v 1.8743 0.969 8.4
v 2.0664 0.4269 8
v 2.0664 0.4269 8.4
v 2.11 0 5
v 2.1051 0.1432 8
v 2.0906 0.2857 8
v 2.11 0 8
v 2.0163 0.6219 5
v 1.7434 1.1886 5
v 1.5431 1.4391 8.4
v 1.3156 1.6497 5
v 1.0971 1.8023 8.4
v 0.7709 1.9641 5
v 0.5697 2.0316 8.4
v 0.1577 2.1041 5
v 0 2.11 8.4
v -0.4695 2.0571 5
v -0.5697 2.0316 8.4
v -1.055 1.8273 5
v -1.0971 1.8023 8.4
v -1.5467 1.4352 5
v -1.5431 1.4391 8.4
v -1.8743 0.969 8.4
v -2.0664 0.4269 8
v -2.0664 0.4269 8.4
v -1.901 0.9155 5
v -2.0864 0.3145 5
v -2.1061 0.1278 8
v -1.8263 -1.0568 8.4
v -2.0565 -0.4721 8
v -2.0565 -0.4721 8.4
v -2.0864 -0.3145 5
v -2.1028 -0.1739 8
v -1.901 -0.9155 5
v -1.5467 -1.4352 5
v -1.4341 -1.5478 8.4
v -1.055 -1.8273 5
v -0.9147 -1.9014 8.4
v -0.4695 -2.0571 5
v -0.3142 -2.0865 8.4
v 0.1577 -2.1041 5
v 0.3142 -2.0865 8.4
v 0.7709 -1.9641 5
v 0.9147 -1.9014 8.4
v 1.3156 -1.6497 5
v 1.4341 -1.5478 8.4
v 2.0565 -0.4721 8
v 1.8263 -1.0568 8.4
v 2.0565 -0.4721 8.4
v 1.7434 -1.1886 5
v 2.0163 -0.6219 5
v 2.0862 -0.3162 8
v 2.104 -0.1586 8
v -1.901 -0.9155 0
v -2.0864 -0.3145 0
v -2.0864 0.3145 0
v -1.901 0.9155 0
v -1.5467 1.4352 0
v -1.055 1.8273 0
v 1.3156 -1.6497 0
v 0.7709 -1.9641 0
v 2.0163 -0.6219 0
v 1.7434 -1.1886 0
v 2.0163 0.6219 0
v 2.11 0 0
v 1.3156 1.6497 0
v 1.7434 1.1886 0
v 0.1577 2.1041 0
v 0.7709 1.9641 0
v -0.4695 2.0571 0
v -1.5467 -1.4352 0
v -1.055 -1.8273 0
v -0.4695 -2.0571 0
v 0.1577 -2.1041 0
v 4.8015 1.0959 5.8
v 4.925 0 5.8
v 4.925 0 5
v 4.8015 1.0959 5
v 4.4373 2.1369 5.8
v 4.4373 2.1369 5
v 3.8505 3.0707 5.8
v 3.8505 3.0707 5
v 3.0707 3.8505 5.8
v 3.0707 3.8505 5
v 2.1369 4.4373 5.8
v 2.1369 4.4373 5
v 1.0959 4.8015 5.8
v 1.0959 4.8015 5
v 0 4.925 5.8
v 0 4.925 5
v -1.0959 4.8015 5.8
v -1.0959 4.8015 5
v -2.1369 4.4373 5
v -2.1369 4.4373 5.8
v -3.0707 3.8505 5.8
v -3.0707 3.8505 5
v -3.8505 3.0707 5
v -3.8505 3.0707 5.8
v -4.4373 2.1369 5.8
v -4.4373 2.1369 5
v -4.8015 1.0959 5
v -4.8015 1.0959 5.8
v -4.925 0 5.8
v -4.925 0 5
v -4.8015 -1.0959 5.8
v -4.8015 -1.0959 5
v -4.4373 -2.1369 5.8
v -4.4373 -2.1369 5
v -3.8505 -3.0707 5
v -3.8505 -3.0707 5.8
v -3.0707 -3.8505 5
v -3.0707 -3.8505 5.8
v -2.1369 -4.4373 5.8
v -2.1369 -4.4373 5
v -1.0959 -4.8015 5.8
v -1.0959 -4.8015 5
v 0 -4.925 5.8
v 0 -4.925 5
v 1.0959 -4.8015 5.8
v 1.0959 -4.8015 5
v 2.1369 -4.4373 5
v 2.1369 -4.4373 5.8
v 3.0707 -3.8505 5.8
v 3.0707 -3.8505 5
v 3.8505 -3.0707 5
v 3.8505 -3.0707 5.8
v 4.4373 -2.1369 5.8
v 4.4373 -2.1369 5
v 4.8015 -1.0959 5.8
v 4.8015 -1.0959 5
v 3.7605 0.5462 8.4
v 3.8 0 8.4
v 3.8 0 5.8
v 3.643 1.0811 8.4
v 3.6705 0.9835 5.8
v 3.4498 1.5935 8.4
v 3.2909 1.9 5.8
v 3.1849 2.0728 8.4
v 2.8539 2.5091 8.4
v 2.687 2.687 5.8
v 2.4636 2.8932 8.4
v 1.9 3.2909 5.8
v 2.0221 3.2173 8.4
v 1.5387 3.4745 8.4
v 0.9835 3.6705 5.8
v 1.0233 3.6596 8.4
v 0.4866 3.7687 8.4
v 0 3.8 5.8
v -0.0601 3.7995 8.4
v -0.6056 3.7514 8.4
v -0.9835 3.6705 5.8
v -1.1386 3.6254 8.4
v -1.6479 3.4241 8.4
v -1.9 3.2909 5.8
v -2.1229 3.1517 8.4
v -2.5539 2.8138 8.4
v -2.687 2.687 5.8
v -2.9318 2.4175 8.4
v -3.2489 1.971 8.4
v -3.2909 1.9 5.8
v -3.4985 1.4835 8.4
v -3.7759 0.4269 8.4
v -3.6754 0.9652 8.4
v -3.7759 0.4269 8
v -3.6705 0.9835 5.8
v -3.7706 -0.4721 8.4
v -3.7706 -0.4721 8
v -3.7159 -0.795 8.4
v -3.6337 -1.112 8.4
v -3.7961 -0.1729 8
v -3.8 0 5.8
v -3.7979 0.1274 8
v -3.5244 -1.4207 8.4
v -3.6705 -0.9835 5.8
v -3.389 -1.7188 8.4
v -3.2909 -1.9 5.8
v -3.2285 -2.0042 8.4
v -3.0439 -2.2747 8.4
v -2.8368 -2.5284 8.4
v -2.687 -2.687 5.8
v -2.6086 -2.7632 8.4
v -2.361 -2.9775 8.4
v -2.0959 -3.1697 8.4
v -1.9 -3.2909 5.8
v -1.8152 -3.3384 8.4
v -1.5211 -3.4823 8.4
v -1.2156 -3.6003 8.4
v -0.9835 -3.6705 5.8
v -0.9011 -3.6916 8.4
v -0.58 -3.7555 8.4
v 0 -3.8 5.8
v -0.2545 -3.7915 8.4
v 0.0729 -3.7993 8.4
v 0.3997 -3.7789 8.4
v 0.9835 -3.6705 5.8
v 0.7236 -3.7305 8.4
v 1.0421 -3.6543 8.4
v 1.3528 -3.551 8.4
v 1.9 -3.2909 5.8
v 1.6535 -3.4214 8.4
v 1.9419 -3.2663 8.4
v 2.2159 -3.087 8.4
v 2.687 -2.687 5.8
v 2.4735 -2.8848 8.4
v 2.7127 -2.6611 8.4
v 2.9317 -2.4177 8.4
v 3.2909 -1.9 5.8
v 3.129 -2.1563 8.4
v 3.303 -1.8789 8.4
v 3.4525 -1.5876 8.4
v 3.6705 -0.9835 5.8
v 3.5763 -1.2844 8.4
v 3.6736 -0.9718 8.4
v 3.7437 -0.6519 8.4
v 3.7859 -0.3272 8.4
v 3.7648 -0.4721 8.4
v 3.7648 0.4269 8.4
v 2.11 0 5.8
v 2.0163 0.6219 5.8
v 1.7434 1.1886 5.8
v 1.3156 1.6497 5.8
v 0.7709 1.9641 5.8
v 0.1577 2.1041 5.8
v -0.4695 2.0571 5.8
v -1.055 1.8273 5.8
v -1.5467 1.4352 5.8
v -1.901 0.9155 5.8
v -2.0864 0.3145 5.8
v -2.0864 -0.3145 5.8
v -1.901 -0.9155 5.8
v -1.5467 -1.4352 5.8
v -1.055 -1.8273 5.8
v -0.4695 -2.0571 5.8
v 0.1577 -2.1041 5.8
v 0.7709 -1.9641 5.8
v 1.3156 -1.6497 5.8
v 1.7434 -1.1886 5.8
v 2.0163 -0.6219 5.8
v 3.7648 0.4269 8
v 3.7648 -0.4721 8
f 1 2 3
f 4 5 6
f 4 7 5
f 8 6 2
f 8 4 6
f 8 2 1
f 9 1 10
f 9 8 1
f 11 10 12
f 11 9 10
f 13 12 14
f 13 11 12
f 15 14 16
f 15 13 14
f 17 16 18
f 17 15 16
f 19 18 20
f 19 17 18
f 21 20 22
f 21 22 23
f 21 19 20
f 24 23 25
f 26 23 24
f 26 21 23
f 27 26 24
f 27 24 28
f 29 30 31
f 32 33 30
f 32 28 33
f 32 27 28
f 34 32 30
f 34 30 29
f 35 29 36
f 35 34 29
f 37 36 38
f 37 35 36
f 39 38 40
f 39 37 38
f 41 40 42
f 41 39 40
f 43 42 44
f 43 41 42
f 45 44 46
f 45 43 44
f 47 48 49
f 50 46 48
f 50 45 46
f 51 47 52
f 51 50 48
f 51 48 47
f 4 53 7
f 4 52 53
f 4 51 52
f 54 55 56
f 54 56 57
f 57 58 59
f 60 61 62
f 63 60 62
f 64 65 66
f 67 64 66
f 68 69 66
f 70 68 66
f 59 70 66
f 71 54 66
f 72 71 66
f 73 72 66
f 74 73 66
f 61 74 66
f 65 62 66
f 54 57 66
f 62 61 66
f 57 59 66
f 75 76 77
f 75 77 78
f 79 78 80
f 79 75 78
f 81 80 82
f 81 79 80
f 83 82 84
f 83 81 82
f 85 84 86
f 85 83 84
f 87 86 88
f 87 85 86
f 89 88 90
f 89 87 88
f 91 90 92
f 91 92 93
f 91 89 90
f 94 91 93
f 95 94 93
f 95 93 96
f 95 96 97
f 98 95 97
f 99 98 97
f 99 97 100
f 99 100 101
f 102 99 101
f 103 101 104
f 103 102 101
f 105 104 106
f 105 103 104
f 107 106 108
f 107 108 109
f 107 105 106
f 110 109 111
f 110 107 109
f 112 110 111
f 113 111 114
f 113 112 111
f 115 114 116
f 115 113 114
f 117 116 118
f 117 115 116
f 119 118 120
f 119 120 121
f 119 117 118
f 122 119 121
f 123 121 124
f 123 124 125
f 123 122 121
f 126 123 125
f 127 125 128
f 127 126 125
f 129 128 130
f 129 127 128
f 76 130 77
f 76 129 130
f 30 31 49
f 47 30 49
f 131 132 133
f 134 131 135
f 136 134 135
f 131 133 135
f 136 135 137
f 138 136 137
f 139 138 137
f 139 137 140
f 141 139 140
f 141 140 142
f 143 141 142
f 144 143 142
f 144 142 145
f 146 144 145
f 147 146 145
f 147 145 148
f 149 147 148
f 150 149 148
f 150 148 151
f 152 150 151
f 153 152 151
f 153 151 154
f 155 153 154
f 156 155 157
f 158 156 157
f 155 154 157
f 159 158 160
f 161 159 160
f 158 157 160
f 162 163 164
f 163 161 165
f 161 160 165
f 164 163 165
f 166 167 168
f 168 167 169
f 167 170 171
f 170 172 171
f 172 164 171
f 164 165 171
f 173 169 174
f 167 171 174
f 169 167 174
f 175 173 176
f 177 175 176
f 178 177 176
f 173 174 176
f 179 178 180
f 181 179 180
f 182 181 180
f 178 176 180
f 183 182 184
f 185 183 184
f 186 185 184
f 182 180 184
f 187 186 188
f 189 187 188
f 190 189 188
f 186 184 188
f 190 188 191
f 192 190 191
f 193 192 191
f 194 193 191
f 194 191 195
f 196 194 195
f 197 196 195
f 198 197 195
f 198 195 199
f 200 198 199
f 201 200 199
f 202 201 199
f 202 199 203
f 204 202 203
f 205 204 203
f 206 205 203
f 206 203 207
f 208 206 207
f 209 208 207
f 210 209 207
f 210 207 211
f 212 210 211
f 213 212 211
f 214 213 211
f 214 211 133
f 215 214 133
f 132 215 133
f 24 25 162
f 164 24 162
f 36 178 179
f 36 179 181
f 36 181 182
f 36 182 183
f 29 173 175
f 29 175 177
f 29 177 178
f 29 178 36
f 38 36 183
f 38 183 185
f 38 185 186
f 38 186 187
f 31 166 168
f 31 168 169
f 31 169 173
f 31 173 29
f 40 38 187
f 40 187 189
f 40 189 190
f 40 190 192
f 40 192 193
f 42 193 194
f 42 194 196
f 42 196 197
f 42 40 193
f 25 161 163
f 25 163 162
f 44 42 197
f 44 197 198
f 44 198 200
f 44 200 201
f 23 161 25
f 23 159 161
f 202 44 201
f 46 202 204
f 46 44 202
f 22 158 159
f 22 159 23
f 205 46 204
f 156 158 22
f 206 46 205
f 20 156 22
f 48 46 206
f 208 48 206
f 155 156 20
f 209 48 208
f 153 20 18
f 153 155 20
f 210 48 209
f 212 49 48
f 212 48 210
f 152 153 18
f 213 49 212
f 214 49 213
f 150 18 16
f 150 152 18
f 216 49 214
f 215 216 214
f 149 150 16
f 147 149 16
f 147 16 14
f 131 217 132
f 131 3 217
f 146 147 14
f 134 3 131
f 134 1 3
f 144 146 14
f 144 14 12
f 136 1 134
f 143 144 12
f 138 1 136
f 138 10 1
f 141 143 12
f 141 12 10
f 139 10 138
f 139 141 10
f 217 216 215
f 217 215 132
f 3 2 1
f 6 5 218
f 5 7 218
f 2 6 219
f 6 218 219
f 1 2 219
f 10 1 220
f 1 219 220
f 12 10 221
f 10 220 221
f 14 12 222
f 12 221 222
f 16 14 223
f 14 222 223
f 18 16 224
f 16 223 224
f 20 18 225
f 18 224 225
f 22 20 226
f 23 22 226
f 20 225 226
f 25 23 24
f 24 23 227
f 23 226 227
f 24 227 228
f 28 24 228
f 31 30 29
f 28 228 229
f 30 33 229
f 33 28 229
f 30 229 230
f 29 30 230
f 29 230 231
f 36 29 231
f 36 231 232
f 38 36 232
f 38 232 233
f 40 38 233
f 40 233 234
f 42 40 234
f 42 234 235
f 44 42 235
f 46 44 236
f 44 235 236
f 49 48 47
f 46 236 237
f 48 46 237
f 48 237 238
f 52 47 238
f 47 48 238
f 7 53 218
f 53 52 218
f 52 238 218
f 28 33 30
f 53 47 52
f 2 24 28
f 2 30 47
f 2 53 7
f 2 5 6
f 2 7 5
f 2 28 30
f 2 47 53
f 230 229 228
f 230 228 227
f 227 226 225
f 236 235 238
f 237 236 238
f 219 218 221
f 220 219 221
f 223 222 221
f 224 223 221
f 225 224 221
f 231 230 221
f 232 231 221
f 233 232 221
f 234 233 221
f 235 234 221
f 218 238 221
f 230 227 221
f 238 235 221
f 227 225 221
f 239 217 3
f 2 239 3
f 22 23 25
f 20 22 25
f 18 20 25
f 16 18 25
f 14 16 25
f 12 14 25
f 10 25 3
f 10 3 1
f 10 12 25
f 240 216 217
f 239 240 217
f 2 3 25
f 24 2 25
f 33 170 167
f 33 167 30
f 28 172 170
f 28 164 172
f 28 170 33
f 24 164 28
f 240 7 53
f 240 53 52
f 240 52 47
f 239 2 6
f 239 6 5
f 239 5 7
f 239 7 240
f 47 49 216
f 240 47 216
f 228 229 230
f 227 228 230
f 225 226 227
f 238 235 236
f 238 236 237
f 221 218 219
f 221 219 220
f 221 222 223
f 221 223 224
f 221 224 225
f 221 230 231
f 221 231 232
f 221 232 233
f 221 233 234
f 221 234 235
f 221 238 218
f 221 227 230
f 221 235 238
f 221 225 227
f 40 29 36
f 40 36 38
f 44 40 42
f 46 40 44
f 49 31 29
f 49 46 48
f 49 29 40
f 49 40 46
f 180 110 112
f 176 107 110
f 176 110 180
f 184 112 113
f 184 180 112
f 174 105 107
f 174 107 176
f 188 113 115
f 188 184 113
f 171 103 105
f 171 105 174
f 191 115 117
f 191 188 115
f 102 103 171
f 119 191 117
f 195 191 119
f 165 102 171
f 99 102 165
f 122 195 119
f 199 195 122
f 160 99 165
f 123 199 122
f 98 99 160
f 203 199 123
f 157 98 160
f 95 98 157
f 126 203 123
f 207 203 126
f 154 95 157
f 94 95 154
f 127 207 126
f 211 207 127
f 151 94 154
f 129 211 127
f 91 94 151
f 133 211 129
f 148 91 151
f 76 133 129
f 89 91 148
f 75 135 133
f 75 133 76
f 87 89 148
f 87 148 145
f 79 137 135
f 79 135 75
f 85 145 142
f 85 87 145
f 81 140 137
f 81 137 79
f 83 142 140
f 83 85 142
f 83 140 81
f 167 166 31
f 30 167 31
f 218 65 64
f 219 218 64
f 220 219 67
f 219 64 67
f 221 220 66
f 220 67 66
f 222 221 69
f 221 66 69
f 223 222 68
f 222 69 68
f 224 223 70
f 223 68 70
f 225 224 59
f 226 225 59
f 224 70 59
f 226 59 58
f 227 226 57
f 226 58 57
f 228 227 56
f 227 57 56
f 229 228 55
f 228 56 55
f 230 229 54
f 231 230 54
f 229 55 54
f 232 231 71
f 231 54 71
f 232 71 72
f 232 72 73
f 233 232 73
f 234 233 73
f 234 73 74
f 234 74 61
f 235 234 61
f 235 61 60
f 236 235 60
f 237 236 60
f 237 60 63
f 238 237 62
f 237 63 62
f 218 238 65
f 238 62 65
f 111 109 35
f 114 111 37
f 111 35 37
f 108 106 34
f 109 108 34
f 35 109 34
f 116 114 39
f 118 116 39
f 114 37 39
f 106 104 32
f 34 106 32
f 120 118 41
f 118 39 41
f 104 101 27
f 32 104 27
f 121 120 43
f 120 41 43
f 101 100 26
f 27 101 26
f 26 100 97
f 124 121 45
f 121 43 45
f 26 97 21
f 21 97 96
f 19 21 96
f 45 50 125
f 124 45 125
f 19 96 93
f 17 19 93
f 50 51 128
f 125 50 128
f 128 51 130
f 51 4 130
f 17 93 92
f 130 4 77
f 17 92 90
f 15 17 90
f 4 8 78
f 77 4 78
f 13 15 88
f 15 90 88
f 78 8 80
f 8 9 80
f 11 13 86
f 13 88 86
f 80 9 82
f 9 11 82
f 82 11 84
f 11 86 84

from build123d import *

# Parameters (mm, degrees)
F0_R     = 2.11
F1_DEPTH = 5.8
F2_R     = 4.925
F2_R_2   = 2.11
F3_DEPTH = 0.8
F4_R     = 3.8
F4_R_2   = 2.11
F5_DEPTH = 2.6
F6_R     = 2.11
F7_DEPTH = 2.6
F9_DEPTH = 0.4


with BuildPart() as f1:
    # F0 (on Top) → F1 (new body)
    with BuildSketch(Plane.XY):
        Circle(F0_R)
    extrude(amount=F1_DEPTH)


with BuildPart() as f3:
    # F2 (on face) → F3 (new body)
    with BuildSketch(Plane.XY.offset(5.8)):
        Circle(F2_R)
        Circle(F2_R_2, mode=Mode.SUBTRACT)
    extrude(amount=-F3_DEPTH)

    # F4 (on face) → F5 (join)
    with BuildSketch(Plane.XY.offset(5.8)):
        Circle(F4_R)
        Circle(F4_R_2, mode=Mode.SUBTRACT)
    extrude(amount=F5_DEPTH)


with BuildPart() as f7:
    # F6 (on face) → F7 (new body)
    with BuildSketch(Plane.XY.offset(5.8)):
        Circle(F6_R)
    extrude(amount=F7_DEPTH)


with BuildPart() as f9_tool:
    # F8 (on face) → F9 (new body)
    with BuildSketch(Plane.XY.offset(8.4)):
        with BuildLine():
            Line((-2.0663575468, 0.4269267956), (-3.8097645156, 0.4269267956))
            Line((-3.8097645156, 0.4269267956), (-3.8097645156, -0.4721327277))
            Line((-3.8097645156, -0.4721327277), (-2.0564996201, -0.4721327277))
            ThreePointArc((-2.0564996201, -0.4721327277), (-2.1098731742, -0.0231341469), (-2.0663575468, 0.4269267956))
        make_face()
        with BuildLine():
            Line((2.0663575468, 0.4269267956), (-2.0663575468, 0.4269267956))
            ThreePointArc((-2.0663575468, 0.4269267956), (-2.1098731742, -0.0231341469), (-2.0564996201, -0.4721327277))
            Line((-2.0564996201, -0.4721327277), (2.0564996201, -0.4721327277))
            ThreePointArc((2.0564996201, -0.4721327277), (2.0965822424, -0.2375771471), (2.11, 0))
            ThreePointArc((2.11, 0), (2.099061031, 0.2145758331), (2.0663575468, 0.4269267956))
        make_face()
        with BuildLine():
            Line((3.7648119032, 0.4269267956), (2.0663575468, 0.4269267956))
            ThreePointArc((2.0663575468, 0.4269267956), (2.099061031, 0.2145758331), (2.11, 0))
            ThreePointArc((2.11, 0), (2.0965822424, -0.2375771471), (2.0564996201, -0.4721327277))
            Line((2.0564996201, -0.4721327277), (3.7648119032, -0.4721327277))
            Line((3.7648119032, -0.4721327277), (3.7648119032, 0.4269267956))
        make_face()
    extrude(amount=-F9_DEPTH)


with BuildPart() as f3_1:
    add(f3.part)

    # F9: cut by f9_tool
    add(f9_tool.part, mode=Mode.SUBTRACT)


with BuildPart() as f7_1:
    add(f7.part)

    # F9: cut by f9_tool
    add(f9_tool.part, mode=Mode.SUBTRACT)


solid = Compound([f1.part, f3_1.part, f7_1.part])
